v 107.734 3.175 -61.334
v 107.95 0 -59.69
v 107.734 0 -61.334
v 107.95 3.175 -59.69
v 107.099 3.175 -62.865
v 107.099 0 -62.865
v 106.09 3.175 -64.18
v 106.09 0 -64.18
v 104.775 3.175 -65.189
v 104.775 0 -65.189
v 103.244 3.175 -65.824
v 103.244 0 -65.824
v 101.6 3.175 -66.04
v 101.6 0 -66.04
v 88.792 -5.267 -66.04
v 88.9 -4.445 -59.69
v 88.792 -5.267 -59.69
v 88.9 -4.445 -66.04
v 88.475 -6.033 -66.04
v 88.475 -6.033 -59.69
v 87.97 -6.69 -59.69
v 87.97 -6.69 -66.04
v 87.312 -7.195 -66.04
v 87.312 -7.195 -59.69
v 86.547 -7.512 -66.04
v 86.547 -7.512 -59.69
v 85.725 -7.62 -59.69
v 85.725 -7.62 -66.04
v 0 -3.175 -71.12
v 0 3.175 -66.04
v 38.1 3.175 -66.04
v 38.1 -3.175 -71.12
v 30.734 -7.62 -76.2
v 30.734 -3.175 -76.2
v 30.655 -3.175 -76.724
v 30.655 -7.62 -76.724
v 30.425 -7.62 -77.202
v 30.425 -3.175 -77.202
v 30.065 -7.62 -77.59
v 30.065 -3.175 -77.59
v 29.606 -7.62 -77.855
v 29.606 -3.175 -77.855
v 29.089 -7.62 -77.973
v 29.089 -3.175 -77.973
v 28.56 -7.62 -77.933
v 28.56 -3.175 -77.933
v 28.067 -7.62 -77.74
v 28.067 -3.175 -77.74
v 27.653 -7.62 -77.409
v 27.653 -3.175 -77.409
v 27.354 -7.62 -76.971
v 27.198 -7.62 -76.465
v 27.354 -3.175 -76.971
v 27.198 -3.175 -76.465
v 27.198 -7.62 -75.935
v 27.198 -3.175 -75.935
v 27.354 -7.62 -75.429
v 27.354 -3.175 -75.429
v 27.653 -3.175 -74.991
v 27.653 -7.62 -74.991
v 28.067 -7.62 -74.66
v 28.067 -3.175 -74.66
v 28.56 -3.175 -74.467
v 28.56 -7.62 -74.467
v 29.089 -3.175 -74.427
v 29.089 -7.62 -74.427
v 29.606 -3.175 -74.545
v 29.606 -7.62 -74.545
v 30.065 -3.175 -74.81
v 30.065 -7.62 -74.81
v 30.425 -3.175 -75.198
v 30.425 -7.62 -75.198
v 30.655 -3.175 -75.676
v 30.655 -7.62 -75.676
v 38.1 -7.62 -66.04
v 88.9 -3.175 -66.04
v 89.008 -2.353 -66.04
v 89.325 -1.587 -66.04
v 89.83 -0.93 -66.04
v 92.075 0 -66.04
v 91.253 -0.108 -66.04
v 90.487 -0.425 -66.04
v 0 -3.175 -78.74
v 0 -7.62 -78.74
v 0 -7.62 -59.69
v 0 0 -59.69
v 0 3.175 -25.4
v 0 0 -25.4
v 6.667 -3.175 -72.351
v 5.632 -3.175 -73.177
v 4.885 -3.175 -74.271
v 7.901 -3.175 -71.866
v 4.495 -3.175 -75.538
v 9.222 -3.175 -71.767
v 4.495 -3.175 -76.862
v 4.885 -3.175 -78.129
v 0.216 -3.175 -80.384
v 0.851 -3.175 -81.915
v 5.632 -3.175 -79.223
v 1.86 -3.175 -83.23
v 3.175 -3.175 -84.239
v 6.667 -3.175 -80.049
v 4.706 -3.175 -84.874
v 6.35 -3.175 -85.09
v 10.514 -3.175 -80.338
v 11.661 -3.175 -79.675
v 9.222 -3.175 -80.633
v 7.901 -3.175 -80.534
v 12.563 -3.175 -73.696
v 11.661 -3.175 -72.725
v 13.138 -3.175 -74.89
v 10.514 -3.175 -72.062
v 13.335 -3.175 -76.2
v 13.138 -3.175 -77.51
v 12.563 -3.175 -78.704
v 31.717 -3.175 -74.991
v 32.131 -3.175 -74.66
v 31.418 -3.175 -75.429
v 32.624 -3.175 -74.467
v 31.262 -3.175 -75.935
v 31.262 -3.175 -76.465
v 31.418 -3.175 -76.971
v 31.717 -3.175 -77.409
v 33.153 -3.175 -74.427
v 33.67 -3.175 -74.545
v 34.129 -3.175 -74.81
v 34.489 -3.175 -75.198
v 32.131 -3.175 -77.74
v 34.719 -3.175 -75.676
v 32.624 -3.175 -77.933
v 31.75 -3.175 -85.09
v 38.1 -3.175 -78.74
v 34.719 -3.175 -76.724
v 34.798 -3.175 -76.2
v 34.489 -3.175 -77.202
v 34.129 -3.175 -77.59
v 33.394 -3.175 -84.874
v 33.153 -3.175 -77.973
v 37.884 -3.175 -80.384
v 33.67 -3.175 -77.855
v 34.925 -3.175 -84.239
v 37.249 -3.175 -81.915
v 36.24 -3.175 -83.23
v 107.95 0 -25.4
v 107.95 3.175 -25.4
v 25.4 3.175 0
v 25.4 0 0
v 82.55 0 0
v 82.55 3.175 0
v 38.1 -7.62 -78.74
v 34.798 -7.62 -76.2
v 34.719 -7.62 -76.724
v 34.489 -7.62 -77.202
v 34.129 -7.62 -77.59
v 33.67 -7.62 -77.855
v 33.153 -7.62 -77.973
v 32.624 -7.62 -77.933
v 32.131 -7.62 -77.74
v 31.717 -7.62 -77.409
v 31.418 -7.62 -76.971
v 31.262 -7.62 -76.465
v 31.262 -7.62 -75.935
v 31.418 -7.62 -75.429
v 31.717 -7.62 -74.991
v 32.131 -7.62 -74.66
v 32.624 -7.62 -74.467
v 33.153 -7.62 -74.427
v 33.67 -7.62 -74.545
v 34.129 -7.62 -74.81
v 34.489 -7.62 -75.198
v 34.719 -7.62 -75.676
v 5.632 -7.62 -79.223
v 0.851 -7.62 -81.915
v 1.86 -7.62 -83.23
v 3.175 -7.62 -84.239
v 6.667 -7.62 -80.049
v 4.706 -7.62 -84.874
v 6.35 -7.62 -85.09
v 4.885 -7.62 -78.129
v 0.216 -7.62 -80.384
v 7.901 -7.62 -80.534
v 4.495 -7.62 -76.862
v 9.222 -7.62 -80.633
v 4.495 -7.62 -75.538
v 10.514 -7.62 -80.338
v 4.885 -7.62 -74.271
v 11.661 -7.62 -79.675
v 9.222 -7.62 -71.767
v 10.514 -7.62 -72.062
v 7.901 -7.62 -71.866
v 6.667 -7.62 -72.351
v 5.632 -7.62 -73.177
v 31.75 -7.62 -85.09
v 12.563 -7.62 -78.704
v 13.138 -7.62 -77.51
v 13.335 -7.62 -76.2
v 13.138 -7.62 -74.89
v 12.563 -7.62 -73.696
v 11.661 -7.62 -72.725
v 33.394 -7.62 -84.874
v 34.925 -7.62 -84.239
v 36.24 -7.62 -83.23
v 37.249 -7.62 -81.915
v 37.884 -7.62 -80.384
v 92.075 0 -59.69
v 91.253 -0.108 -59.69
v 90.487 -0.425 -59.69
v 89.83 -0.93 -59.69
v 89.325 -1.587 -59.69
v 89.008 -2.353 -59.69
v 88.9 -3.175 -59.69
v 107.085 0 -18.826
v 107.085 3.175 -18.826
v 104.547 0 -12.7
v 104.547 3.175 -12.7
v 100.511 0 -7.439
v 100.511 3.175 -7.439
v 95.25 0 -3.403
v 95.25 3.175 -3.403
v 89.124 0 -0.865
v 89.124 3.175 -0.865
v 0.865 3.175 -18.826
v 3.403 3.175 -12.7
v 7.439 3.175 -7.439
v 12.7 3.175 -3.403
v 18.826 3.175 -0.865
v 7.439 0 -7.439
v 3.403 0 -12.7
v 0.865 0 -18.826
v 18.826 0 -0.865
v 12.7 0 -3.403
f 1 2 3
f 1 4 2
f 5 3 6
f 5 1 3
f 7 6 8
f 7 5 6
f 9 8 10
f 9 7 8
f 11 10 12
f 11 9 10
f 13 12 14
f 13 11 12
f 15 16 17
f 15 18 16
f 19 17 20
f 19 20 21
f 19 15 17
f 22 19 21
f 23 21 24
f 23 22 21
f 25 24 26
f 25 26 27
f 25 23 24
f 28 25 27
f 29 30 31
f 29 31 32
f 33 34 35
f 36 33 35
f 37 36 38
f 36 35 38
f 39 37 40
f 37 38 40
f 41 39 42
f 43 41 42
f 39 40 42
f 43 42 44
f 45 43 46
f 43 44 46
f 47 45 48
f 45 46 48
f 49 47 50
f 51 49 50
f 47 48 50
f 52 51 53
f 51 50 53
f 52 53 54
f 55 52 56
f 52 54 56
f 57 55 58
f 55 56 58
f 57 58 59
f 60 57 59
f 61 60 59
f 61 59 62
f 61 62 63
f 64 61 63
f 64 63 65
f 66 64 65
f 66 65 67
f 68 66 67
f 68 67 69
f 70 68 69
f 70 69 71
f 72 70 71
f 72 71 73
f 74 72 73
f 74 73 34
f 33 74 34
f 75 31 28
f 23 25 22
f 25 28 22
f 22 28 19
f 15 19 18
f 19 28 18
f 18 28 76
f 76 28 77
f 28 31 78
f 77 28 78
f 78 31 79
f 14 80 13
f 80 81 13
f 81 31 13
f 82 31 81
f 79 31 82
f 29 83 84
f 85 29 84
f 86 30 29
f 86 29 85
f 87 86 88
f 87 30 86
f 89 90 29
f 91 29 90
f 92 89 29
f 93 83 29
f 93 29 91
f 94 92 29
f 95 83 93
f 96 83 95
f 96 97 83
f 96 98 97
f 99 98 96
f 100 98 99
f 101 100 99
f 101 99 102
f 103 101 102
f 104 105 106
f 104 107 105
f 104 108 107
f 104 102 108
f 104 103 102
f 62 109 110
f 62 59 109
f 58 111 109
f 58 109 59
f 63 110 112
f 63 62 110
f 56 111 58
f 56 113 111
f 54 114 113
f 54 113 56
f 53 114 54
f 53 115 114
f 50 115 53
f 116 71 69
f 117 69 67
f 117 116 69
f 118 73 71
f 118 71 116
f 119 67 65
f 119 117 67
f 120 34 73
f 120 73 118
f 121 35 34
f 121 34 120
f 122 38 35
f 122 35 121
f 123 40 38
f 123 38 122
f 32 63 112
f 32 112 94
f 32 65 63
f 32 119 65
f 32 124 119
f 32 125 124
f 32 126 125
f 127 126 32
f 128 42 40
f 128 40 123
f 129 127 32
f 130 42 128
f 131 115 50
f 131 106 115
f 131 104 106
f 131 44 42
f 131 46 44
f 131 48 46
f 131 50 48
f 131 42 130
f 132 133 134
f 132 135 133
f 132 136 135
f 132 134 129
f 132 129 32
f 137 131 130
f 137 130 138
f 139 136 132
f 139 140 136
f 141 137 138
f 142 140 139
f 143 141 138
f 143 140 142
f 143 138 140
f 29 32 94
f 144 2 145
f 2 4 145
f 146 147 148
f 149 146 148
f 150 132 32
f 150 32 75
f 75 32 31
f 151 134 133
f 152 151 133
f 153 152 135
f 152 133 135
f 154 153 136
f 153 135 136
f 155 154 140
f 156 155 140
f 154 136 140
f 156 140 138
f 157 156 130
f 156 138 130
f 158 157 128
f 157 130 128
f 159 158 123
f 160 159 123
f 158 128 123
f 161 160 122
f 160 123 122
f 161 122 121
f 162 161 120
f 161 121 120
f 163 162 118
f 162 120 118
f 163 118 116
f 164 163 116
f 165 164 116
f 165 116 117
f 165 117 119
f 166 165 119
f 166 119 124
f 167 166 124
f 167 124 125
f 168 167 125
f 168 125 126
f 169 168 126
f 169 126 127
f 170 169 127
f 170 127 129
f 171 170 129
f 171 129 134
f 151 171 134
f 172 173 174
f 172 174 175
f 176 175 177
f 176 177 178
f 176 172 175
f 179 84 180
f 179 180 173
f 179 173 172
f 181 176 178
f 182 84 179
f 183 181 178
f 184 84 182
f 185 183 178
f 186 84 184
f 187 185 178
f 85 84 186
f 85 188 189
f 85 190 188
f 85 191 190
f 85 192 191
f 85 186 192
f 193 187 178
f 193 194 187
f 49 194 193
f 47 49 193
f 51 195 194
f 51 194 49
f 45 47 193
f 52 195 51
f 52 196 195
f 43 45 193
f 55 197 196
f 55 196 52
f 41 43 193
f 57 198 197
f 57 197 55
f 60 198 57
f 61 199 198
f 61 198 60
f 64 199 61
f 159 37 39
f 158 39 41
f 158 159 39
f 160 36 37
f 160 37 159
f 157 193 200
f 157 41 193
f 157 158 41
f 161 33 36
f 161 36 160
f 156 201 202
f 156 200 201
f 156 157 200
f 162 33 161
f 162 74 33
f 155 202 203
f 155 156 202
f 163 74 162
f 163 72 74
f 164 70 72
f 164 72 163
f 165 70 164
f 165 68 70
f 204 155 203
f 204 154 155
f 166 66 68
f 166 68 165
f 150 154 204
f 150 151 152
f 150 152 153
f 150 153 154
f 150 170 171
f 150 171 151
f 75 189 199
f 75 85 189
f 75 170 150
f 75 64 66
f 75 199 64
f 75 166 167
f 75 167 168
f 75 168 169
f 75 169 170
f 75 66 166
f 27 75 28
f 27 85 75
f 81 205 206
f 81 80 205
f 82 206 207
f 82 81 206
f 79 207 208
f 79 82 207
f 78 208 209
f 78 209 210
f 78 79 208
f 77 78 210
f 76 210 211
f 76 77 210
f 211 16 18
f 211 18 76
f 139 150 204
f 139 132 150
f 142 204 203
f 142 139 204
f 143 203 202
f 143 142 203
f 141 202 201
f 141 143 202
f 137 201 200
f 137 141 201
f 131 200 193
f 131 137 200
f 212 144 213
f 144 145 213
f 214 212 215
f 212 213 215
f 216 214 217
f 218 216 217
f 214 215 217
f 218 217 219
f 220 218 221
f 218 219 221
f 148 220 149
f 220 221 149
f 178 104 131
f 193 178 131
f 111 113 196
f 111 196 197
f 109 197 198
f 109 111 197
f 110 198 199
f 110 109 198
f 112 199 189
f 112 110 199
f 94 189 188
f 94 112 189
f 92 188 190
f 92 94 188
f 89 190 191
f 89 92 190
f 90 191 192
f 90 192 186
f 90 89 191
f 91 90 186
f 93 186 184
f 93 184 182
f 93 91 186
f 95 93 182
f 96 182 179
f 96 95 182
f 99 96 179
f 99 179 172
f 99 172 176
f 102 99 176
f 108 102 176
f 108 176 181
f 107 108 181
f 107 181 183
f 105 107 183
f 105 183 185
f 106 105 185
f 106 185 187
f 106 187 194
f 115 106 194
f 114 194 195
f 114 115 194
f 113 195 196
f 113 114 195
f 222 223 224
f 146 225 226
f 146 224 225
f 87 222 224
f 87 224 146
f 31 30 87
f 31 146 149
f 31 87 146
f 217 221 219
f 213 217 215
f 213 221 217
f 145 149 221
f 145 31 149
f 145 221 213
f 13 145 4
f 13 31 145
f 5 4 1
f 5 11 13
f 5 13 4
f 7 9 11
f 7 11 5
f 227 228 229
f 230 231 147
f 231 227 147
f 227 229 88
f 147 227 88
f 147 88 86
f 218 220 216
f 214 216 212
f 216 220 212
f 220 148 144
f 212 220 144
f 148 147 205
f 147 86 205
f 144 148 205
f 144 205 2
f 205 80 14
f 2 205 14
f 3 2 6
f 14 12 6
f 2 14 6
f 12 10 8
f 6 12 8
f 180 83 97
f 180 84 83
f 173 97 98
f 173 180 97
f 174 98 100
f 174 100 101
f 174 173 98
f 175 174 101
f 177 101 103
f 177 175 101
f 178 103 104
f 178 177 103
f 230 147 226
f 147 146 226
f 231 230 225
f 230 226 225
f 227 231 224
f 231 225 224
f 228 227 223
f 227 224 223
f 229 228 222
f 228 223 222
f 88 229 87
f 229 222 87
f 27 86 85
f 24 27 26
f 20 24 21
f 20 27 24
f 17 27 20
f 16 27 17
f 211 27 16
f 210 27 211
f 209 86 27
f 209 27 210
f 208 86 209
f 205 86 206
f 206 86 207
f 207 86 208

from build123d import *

# Parameters (mm, degrees)
SKETCH1_W           = 107.95
SKETCH1_H           = 85.09
SKETCH1_R           = 4.445
BOSS_EXTRUDE1_DEPTH = 3.175
SKETCH2_W           = 107.95
SKETCH2_H           = 25.4
SKETCH2_R           = 4.445
BOSS_EXTRUDE2_DEPTH = 7.62
SKETCH3_W           = 69.85
SKETCH3_H           = 19.05
CUT_EXTRUDE1_DEPTH  = 11.795
SKETCH4_W           = 38.1
SKETCH4_H           = 19.05
CUT_EXTRUDE2_DEPTH  = 6.35
SKETCH5_R           = 1.778
CUT_EXTRUDE3_DEPTH  = 5.445
SKETCH6_W           = 19.05
SKETCH6_H           = 7.62
CUT_EXTRUDE4_DEPTH  = 26.4
BOSS_EXTRUDE3_DEPTH = 38.1
FILLET1_R           = 25.4
FILLET2_R           = 6.35
FILLET3_R           = 3.175


with BuildPart() as part:
    # Sketch1 → Boss-Extrude1 (new body)
    with BuildSketch(Plane(origin=(0, 0, 0), x_dir=(1, 0, 0), z_dir=(0, 1, 0))):
        with Locations((53.975, 42.545)):
            Rectangle(SKETCH1_W, SKETCH1_H)
        with Locations((8.89, 76.2)):
            Circle(SKETCH1_R, mode=Mode.SUBTRACT)
    extrude(amount=BOSS_EXTRUDE1_DEPTH)

    # Sketch2 → Boss-Extrude2 (add)
    with BuildSketch(Plane.XZ):
        with Locations((53.975, -72.39)):
            Rectangle(SKETCH2_W, SKETCH2_H)
        with Locations((8.89, -76.2)):
            Circle(SKETCH2_R, mode=Mode.SUBTRACT)
    extrude(amount=BOSS_EXTRUDE2_DEPTH)

    # Sketch3 → Cut-Extrude1 (cut, through all)
    with BuildSketch(Plane.XZ.offset(7.62)):
        with Locations((73.025, -75.565)):
            Rectangle(SKETCH3_W, SKETCH3_H)
    extrude(amount=-CUT_EXTRUDE1_DEPTH, mode=Mode.SUBTRACT)

    # Sketch4 → Cut-Extrude2 (cut)
    with BuildSketch(Plane(origin=(0, 3.175, 0), x_dir=(1, 0, 0), z_dir=(0, 1, 0))):
        with Locations((19.05, 75.565)):
            Rectangle(SKETCH4_W, SKETCH4_H)
    extrude(amount=-CUT_EXTRUDE2_DEPTH, mode=Mode.SUBTRACT)

    # Sketch5 → Cut-Extrude3 (cut, through all)
    with BuildSketch(Plane(origin=(0, -3.175, 0), x_dir=(1, 0, 0), z_dir=(0, 1, 0))):
        with Locations((28.956, 76.2)):
            Circle(SKETCH5_R)
        with Locations((33.02, 76.2)):
            Circle(SKETCH5_R)
    extrude(amount=-CUT_EXTRUDE3_DEPTH, mode=Mode.SUBTRACT)

    # Sketch6 → Cut-Extrude4 (cut, through all)
    with BuildSketch(Plane.XY.offset(-59.69)):
        with Locations((98.425, -3.81)):
            Rectangle(SKETCH6_W, SKETCH6_H)
    extrude(amount=-CUT_EXTRUDE4_DEPTH, mode=Mode.SUBTRACT)

    # Sketch7 → Boss-Extrude3 (add)
    with BuildSketch(Plane.ZY):
        Polygon((-66.04, 3.175), (-71.12, -3.175), (-66.04, -3.175), align=None)
    extrude(amount=-BOSS_EXTRUDE3_DEPTH)

    # Fillet1
    fillet1_edges = [part.edges().sort_by_distance(p)[0] for p in [
        (107.95, 1.5875, 0),
        (0, 1.5875, 0),
    ]]
    fillet(fillet1_edges, radius=FILLET1_R)

    # Fillet2
    fillet2_edges = [part.edges().sort_by_distance(p)[0] for p in [
        (107.95, 1.5875, -66.04),
        (38.1, -5.3975, -85.09),
        (0, -5.3975, -85.09),
    ]]
    fillet(fillet2_edges, radius=FILLET2_R)

    # Fillet3
    fillet3_edges = [part.edges().sort_by_distance(p)[0] for p in [
        (88.9, -7.62, -62.865),
        (88.9, 0, -62.865),
    ]]
    fillet(fillet3_edges, radius=FILLET3_R)


solid = part.part
